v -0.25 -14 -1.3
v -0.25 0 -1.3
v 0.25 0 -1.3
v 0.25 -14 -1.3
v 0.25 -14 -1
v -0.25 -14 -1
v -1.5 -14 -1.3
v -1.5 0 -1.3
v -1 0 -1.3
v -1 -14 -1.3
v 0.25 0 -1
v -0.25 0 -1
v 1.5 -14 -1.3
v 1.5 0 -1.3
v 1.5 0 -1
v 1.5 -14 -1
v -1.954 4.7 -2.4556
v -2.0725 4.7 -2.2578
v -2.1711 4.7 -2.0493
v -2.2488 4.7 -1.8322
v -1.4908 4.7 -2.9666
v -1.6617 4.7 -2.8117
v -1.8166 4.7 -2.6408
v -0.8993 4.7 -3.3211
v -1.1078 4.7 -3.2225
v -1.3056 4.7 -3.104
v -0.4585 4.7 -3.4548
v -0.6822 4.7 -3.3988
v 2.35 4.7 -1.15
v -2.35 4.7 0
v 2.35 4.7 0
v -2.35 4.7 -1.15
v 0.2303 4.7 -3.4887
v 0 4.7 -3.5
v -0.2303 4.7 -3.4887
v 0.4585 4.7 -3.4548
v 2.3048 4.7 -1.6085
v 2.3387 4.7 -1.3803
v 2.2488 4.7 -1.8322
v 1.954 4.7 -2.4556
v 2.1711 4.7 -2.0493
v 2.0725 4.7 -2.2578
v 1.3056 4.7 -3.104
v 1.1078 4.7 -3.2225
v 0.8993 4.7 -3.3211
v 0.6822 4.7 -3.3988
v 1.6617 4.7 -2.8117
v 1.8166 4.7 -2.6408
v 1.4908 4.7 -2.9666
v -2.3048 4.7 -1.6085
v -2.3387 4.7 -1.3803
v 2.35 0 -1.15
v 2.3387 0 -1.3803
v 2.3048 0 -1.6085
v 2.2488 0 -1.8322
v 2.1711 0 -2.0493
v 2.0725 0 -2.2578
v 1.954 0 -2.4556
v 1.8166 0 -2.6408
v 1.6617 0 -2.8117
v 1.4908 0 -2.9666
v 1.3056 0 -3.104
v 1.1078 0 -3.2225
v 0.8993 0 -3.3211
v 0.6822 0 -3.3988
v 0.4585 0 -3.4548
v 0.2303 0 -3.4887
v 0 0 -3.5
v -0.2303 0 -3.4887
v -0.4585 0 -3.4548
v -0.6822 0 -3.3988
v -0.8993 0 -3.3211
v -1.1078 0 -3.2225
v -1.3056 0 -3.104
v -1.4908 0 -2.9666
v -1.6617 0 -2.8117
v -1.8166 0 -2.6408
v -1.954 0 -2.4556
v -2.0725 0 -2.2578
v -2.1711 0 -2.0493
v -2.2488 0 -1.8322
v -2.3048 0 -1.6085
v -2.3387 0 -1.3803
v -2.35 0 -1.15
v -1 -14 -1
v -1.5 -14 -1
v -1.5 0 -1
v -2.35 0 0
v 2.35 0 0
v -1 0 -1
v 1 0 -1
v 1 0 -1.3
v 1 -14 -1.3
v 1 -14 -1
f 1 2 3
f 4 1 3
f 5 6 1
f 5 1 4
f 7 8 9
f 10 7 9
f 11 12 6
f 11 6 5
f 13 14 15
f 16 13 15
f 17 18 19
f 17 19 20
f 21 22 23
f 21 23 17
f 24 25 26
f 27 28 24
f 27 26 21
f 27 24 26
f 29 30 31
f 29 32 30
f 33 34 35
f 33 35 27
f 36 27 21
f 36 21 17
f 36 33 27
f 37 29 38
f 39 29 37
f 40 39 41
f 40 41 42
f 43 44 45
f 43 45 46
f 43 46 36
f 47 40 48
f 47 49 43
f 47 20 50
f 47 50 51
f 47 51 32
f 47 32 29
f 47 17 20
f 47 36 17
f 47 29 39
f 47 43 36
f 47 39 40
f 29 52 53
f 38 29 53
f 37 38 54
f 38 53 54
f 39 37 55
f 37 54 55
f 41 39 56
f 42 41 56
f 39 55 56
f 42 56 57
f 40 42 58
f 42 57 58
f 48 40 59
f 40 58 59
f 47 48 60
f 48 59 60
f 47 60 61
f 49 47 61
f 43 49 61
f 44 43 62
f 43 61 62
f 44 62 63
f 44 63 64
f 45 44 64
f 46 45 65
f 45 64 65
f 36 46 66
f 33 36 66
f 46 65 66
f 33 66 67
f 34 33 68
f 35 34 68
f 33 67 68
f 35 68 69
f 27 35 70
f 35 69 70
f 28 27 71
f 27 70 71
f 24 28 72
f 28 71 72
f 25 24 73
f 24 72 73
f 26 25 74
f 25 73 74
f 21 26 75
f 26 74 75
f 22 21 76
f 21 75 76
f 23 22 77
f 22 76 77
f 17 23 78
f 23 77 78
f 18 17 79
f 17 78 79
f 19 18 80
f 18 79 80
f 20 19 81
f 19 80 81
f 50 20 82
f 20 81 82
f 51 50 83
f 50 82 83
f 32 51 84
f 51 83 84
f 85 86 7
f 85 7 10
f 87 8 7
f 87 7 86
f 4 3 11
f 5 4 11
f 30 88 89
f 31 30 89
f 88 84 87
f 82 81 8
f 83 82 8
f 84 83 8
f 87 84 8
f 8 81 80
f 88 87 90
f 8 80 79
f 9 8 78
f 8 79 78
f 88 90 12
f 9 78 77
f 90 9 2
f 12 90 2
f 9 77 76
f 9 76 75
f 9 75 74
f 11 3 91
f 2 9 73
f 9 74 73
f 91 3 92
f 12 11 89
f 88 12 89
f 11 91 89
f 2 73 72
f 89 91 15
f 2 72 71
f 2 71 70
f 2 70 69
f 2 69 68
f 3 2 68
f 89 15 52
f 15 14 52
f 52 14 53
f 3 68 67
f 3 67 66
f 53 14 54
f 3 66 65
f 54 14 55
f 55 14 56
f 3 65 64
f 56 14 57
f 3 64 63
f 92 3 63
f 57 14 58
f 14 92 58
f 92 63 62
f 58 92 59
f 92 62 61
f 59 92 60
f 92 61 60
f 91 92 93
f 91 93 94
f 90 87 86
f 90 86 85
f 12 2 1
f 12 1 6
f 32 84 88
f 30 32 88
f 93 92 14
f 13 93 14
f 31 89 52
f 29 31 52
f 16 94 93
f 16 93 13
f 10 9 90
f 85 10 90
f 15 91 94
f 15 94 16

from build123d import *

# Parameters (mm, degrees)
EXTRUDE_1_DEPTH = 4.7
SKETCH_2_W      = 0.5
SKETCH_2_H      = 0.3
EXTRUDE_2_DEPTH = 14


with BuildPart() as part:
    # 草图1 → 凸台-拉伸1 (new body)
    with BuildSketch(Plane(origin=(0, 0, 0), x_dir=(1, 0, 0), z_dir=(0, 1, 0))):
        with BuildLine():
            Line((-2.35, 0), (2.35, 0))
            Line((2.35, 0), (2.35, 1.15))
            ThreePointArc((2.35, 1.15), (0, 3.5), (-2.35, 1.15))
            Line((-2.35, 1.15), (-2.35, 0))
        make_face()
    extrude(amount=EXTRUDE_1_DEPTH)

    # 草图2 → 凸台-拉伸2 (add)
    with BuildSketch(Plane.XZ):
        with Locations((1.25, -1.15)):
            Rectangle(SKETCH_2_W, SKETCH_2_H)
        with Locations((0, -1.15)):
            Rectangle(SKETCH_2_W, SKETCH_2_H)
        with Locations((-1.25, -1.15)):
            Rectangle(SKETCH_2_W, SKETCH_2_H)
    extrude(amount=EXTRUDE_2_DEPTH)


solid = part.part
